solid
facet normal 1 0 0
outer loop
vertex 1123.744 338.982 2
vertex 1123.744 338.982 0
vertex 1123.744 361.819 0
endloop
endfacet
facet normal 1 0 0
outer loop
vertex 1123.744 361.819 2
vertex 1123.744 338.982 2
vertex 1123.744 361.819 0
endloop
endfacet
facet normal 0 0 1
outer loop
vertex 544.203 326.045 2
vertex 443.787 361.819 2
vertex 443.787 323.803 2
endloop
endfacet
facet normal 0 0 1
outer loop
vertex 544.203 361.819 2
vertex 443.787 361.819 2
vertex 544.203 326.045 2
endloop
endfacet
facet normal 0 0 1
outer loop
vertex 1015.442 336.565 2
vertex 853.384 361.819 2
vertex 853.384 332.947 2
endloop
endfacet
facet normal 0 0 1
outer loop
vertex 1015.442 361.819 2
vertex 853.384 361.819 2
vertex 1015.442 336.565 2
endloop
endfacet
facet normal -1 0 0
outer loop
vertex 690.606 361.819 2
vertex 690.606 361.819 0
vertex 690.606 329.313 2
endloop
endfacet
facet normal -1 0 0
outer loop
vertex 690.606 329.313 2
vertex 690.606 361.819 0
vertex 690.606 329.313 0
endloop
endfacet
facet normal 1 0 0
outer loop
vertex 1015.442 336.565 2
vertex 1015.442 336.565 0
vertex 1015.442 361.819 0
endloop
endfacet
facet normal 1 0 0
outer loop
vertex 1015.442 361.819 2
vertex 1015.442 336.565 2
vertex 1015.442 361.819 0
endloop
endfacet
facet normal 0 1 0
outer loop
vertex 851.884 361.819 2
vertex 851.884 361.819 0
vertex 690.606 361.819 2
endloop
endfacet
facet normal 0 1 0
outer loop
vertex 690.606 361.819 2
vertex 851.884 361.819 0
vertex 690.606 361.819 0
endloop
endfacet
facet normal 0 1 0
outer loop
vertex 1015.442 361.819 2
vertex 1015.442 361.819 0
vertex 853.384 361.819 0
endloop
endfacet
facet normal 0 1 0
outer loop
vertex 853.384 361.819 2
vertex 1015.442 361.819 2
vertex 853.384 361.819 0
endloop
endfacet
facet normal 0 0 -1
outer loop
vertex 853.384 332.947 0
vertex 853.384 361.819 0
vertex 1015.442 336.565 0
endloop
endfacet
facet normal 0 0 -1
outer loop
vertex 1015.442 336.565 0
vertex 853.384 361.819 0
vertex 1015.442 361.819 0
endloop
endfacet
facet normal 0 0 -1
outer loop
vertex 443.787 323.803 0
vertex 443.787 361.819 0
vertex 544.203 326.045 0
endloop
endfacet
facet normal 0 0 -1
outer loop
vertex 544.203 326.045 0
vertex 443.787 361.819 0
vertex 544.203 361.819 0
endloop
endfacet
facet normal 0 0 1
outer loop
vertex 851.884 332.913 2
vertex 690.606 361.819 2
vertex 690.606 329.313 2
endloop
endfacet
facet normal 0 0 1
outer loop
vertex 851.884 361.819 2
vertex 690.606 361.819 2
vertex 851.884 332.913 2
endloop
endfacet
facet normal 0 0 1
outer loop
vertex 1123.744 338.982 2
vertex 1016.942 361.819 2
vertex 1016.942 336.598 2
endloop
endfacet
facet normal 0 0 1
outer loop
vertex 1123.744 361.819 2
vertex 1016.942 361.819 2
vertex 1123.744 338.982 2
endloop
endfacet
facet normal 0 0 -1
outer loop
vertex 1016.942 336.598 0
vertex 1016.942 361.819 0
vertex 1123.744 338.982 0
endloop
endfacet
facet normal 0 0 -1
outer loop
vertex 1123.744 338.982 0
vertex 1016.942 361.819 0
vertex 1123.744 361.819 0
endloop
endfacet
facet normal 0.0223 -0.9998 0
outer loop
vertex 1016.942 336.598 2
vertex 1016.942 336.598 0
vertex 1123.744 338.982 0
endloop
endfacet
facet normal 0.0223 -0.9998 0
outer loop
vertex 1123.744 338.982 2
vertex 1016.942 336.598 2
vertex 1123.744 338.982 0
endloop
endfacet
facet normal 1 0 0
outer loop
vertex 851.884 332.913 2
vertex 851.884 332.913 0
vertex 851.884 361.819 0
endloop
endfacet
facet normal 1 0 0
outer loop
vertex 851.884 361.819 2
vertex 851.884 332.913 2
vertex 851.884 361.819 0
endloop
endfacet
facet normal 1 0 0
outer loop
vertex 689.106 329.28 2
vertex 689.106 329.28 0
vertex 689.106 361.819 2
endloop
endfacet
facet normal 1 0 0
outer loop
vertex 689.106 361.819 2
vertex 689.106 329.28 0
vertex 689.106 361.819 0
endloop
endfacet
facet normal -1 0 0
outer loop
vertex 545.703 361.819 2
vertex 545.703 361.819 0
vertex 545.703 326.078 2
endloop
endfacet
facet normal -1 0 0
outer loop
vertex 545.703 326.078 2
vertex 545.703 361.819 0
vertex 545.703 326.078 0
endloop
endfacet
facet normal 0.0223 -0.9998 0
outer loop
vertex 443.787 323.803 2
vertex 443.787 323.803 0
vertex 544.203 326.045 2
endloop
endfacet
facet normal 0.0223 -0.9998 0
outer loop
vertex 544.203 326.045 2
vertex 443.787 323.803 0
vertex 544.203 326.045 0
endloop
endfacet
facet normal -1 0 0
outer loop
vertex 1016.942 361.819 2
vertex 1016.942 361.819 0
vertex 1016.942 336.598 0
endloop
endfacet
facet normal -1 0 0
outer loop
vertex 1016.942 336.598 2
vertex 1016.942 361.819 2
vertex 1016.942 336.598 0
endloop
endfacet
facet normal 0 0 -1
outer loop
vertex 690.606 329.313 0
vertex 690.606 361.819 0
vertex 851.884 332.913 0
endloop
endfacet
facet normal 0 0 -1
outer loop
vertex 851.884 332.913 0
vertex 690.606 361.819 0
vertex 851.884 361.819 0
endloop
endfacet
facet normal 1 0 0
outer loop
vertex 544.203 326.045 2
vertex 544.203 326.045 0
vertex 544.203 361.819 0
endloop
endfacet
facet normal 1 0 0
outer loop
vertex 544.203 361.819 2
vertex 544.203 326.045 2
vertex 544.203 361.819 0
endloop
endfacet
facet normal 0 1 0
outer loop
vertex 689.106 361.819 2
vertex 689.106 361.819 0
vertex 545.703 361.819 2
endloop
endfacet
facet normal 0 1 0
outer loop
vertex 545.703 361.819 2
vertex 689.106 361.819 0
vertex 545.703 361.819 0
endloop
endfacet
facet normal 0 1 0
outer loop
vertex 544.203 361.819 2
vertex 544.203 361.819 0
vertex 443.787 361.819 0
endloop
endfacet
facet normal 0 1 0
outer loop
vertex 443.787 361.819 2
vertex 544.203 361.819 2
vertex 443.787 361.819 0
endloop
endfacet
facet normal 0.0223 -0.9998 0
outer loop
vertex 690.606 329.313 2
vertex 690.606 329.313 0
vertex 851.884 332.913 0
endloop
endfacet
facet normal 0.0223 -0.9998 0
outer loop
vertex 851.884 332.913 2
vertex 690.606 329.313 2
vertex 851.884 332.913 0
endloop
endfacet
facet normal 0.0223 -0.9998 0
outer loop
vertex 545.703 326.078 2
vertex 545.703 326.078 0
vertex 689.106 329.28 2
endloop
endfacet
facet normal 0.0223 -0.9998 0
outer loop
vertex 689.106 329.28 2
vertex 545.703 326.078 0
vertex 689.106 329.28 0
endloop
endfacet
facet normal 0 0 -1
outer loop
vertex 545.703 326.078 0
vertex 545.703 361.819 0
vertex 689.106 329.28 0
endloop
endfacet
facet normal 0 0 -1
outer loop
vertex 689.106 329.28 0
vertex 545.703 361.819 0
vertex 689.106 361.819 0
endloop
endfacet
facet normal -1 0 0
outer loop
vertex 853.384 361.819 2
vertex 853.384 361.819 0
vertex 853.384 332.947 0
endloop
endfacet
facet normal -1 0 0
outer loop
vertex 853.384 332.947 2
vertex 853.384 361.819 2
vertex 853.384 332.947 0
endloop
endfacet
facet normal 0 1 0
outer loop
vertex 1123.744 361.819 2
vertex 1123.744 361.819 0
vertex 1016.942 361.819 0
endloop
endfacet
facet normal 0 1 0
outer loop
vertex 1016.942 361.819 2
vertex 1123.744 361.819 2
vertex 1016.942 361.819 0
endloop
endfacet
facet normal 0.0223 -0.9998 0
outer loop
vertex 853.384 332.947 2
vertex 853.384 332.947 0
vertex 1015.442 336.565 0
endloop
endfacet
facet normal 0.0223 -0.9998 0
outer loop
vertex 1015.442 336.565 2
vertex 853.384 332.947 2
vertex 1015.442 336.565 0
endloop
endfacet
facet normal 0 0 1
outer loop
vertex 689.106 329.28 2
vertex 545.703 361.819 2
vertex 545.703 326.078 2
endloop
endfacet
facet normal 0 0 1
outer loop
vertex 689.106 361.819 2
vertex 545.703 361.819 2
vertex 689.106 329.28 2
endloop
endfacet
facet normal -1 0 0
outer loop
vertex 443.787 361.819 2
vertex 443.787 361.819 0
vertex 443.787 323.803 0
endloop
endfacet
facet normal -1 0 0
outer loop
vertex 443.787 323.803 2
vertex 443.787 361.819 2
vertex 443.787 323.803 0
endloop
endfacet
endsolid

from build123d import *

# Parameters (mm, degrees)
EXTRUDE_1_DEPTH   = 2
EXTRUDE_1_2_DEPTH = 2
EXTRUDE_1_3_DEPTH = 2
EXTRUDE_1_4_DEPTH = 2
EXTRUDE_1_5_DEPTH = 2


with BuildPart() as part:
    # Model → 凸台-拉伸1 (new body)
    with BuildSketch(Plane.XY):
        Polygon((443.787377051, 361.818846768), (443.787377051, 323.803187424), (544.202532921, 326.044820391), (544.202532921, 361.818846768), align=None)
    extrude(amount=EXTRUDE_1_DEPTH)


with BuildPart() as body_2:
    # Model → Extrude 1 2 (new body)
    with BuildSketch(Plane.XY):
        Polygon((545.702532921, 361.818846768), (545.702532921, 326.078305869), (689.106151826, 329.279598312), (689.106151826, 361.818846768), align=None)
    extrude(amount=EXTRUDE_1_2_DEPTH)


with BuildPart() as body_3:
    # Model → Extrude 1 3 (new body)
    with BuildSketch(Plane.XY):
        Polygon((690.606151826, 361.818846768), (690.606151826, 329.31308379), (851.883517512, 332.913383532), (851.883517512, 361.818846768), align=None)
    extrude(amount=EXTRUDE_1_3_DEPTH)


with BuildPart() as body_4:
    # Model → Extrude 1 4 (new body)
    with BuildSketch(Plane.XY):
        Polygon((853.383517512, 361.818846768), (853.383517512, 332.94686901), (1015.441597844, 336.564597153), (1015.441597844, 361.818846768), align=None)
    extrude(amount=EXTRUDE_1_4_DEPTH)


with BuildPart() as body_5:
    # Model → Extrude 1 5 (new body)
    with BuildSketch(Plane.XY):
        Polygon((1016.941597844, 361.818846768), (1016.941597844, 336.598082631), (1123.744283191, 338.982308581), (1123.744283191, 361.818846768), align=None)
    extrude(amount=EXTRUDE_1_5_DEPTH)


solid = Compound([part.part, body_2.part, body_3.part, body_4.part, body_5.part])
